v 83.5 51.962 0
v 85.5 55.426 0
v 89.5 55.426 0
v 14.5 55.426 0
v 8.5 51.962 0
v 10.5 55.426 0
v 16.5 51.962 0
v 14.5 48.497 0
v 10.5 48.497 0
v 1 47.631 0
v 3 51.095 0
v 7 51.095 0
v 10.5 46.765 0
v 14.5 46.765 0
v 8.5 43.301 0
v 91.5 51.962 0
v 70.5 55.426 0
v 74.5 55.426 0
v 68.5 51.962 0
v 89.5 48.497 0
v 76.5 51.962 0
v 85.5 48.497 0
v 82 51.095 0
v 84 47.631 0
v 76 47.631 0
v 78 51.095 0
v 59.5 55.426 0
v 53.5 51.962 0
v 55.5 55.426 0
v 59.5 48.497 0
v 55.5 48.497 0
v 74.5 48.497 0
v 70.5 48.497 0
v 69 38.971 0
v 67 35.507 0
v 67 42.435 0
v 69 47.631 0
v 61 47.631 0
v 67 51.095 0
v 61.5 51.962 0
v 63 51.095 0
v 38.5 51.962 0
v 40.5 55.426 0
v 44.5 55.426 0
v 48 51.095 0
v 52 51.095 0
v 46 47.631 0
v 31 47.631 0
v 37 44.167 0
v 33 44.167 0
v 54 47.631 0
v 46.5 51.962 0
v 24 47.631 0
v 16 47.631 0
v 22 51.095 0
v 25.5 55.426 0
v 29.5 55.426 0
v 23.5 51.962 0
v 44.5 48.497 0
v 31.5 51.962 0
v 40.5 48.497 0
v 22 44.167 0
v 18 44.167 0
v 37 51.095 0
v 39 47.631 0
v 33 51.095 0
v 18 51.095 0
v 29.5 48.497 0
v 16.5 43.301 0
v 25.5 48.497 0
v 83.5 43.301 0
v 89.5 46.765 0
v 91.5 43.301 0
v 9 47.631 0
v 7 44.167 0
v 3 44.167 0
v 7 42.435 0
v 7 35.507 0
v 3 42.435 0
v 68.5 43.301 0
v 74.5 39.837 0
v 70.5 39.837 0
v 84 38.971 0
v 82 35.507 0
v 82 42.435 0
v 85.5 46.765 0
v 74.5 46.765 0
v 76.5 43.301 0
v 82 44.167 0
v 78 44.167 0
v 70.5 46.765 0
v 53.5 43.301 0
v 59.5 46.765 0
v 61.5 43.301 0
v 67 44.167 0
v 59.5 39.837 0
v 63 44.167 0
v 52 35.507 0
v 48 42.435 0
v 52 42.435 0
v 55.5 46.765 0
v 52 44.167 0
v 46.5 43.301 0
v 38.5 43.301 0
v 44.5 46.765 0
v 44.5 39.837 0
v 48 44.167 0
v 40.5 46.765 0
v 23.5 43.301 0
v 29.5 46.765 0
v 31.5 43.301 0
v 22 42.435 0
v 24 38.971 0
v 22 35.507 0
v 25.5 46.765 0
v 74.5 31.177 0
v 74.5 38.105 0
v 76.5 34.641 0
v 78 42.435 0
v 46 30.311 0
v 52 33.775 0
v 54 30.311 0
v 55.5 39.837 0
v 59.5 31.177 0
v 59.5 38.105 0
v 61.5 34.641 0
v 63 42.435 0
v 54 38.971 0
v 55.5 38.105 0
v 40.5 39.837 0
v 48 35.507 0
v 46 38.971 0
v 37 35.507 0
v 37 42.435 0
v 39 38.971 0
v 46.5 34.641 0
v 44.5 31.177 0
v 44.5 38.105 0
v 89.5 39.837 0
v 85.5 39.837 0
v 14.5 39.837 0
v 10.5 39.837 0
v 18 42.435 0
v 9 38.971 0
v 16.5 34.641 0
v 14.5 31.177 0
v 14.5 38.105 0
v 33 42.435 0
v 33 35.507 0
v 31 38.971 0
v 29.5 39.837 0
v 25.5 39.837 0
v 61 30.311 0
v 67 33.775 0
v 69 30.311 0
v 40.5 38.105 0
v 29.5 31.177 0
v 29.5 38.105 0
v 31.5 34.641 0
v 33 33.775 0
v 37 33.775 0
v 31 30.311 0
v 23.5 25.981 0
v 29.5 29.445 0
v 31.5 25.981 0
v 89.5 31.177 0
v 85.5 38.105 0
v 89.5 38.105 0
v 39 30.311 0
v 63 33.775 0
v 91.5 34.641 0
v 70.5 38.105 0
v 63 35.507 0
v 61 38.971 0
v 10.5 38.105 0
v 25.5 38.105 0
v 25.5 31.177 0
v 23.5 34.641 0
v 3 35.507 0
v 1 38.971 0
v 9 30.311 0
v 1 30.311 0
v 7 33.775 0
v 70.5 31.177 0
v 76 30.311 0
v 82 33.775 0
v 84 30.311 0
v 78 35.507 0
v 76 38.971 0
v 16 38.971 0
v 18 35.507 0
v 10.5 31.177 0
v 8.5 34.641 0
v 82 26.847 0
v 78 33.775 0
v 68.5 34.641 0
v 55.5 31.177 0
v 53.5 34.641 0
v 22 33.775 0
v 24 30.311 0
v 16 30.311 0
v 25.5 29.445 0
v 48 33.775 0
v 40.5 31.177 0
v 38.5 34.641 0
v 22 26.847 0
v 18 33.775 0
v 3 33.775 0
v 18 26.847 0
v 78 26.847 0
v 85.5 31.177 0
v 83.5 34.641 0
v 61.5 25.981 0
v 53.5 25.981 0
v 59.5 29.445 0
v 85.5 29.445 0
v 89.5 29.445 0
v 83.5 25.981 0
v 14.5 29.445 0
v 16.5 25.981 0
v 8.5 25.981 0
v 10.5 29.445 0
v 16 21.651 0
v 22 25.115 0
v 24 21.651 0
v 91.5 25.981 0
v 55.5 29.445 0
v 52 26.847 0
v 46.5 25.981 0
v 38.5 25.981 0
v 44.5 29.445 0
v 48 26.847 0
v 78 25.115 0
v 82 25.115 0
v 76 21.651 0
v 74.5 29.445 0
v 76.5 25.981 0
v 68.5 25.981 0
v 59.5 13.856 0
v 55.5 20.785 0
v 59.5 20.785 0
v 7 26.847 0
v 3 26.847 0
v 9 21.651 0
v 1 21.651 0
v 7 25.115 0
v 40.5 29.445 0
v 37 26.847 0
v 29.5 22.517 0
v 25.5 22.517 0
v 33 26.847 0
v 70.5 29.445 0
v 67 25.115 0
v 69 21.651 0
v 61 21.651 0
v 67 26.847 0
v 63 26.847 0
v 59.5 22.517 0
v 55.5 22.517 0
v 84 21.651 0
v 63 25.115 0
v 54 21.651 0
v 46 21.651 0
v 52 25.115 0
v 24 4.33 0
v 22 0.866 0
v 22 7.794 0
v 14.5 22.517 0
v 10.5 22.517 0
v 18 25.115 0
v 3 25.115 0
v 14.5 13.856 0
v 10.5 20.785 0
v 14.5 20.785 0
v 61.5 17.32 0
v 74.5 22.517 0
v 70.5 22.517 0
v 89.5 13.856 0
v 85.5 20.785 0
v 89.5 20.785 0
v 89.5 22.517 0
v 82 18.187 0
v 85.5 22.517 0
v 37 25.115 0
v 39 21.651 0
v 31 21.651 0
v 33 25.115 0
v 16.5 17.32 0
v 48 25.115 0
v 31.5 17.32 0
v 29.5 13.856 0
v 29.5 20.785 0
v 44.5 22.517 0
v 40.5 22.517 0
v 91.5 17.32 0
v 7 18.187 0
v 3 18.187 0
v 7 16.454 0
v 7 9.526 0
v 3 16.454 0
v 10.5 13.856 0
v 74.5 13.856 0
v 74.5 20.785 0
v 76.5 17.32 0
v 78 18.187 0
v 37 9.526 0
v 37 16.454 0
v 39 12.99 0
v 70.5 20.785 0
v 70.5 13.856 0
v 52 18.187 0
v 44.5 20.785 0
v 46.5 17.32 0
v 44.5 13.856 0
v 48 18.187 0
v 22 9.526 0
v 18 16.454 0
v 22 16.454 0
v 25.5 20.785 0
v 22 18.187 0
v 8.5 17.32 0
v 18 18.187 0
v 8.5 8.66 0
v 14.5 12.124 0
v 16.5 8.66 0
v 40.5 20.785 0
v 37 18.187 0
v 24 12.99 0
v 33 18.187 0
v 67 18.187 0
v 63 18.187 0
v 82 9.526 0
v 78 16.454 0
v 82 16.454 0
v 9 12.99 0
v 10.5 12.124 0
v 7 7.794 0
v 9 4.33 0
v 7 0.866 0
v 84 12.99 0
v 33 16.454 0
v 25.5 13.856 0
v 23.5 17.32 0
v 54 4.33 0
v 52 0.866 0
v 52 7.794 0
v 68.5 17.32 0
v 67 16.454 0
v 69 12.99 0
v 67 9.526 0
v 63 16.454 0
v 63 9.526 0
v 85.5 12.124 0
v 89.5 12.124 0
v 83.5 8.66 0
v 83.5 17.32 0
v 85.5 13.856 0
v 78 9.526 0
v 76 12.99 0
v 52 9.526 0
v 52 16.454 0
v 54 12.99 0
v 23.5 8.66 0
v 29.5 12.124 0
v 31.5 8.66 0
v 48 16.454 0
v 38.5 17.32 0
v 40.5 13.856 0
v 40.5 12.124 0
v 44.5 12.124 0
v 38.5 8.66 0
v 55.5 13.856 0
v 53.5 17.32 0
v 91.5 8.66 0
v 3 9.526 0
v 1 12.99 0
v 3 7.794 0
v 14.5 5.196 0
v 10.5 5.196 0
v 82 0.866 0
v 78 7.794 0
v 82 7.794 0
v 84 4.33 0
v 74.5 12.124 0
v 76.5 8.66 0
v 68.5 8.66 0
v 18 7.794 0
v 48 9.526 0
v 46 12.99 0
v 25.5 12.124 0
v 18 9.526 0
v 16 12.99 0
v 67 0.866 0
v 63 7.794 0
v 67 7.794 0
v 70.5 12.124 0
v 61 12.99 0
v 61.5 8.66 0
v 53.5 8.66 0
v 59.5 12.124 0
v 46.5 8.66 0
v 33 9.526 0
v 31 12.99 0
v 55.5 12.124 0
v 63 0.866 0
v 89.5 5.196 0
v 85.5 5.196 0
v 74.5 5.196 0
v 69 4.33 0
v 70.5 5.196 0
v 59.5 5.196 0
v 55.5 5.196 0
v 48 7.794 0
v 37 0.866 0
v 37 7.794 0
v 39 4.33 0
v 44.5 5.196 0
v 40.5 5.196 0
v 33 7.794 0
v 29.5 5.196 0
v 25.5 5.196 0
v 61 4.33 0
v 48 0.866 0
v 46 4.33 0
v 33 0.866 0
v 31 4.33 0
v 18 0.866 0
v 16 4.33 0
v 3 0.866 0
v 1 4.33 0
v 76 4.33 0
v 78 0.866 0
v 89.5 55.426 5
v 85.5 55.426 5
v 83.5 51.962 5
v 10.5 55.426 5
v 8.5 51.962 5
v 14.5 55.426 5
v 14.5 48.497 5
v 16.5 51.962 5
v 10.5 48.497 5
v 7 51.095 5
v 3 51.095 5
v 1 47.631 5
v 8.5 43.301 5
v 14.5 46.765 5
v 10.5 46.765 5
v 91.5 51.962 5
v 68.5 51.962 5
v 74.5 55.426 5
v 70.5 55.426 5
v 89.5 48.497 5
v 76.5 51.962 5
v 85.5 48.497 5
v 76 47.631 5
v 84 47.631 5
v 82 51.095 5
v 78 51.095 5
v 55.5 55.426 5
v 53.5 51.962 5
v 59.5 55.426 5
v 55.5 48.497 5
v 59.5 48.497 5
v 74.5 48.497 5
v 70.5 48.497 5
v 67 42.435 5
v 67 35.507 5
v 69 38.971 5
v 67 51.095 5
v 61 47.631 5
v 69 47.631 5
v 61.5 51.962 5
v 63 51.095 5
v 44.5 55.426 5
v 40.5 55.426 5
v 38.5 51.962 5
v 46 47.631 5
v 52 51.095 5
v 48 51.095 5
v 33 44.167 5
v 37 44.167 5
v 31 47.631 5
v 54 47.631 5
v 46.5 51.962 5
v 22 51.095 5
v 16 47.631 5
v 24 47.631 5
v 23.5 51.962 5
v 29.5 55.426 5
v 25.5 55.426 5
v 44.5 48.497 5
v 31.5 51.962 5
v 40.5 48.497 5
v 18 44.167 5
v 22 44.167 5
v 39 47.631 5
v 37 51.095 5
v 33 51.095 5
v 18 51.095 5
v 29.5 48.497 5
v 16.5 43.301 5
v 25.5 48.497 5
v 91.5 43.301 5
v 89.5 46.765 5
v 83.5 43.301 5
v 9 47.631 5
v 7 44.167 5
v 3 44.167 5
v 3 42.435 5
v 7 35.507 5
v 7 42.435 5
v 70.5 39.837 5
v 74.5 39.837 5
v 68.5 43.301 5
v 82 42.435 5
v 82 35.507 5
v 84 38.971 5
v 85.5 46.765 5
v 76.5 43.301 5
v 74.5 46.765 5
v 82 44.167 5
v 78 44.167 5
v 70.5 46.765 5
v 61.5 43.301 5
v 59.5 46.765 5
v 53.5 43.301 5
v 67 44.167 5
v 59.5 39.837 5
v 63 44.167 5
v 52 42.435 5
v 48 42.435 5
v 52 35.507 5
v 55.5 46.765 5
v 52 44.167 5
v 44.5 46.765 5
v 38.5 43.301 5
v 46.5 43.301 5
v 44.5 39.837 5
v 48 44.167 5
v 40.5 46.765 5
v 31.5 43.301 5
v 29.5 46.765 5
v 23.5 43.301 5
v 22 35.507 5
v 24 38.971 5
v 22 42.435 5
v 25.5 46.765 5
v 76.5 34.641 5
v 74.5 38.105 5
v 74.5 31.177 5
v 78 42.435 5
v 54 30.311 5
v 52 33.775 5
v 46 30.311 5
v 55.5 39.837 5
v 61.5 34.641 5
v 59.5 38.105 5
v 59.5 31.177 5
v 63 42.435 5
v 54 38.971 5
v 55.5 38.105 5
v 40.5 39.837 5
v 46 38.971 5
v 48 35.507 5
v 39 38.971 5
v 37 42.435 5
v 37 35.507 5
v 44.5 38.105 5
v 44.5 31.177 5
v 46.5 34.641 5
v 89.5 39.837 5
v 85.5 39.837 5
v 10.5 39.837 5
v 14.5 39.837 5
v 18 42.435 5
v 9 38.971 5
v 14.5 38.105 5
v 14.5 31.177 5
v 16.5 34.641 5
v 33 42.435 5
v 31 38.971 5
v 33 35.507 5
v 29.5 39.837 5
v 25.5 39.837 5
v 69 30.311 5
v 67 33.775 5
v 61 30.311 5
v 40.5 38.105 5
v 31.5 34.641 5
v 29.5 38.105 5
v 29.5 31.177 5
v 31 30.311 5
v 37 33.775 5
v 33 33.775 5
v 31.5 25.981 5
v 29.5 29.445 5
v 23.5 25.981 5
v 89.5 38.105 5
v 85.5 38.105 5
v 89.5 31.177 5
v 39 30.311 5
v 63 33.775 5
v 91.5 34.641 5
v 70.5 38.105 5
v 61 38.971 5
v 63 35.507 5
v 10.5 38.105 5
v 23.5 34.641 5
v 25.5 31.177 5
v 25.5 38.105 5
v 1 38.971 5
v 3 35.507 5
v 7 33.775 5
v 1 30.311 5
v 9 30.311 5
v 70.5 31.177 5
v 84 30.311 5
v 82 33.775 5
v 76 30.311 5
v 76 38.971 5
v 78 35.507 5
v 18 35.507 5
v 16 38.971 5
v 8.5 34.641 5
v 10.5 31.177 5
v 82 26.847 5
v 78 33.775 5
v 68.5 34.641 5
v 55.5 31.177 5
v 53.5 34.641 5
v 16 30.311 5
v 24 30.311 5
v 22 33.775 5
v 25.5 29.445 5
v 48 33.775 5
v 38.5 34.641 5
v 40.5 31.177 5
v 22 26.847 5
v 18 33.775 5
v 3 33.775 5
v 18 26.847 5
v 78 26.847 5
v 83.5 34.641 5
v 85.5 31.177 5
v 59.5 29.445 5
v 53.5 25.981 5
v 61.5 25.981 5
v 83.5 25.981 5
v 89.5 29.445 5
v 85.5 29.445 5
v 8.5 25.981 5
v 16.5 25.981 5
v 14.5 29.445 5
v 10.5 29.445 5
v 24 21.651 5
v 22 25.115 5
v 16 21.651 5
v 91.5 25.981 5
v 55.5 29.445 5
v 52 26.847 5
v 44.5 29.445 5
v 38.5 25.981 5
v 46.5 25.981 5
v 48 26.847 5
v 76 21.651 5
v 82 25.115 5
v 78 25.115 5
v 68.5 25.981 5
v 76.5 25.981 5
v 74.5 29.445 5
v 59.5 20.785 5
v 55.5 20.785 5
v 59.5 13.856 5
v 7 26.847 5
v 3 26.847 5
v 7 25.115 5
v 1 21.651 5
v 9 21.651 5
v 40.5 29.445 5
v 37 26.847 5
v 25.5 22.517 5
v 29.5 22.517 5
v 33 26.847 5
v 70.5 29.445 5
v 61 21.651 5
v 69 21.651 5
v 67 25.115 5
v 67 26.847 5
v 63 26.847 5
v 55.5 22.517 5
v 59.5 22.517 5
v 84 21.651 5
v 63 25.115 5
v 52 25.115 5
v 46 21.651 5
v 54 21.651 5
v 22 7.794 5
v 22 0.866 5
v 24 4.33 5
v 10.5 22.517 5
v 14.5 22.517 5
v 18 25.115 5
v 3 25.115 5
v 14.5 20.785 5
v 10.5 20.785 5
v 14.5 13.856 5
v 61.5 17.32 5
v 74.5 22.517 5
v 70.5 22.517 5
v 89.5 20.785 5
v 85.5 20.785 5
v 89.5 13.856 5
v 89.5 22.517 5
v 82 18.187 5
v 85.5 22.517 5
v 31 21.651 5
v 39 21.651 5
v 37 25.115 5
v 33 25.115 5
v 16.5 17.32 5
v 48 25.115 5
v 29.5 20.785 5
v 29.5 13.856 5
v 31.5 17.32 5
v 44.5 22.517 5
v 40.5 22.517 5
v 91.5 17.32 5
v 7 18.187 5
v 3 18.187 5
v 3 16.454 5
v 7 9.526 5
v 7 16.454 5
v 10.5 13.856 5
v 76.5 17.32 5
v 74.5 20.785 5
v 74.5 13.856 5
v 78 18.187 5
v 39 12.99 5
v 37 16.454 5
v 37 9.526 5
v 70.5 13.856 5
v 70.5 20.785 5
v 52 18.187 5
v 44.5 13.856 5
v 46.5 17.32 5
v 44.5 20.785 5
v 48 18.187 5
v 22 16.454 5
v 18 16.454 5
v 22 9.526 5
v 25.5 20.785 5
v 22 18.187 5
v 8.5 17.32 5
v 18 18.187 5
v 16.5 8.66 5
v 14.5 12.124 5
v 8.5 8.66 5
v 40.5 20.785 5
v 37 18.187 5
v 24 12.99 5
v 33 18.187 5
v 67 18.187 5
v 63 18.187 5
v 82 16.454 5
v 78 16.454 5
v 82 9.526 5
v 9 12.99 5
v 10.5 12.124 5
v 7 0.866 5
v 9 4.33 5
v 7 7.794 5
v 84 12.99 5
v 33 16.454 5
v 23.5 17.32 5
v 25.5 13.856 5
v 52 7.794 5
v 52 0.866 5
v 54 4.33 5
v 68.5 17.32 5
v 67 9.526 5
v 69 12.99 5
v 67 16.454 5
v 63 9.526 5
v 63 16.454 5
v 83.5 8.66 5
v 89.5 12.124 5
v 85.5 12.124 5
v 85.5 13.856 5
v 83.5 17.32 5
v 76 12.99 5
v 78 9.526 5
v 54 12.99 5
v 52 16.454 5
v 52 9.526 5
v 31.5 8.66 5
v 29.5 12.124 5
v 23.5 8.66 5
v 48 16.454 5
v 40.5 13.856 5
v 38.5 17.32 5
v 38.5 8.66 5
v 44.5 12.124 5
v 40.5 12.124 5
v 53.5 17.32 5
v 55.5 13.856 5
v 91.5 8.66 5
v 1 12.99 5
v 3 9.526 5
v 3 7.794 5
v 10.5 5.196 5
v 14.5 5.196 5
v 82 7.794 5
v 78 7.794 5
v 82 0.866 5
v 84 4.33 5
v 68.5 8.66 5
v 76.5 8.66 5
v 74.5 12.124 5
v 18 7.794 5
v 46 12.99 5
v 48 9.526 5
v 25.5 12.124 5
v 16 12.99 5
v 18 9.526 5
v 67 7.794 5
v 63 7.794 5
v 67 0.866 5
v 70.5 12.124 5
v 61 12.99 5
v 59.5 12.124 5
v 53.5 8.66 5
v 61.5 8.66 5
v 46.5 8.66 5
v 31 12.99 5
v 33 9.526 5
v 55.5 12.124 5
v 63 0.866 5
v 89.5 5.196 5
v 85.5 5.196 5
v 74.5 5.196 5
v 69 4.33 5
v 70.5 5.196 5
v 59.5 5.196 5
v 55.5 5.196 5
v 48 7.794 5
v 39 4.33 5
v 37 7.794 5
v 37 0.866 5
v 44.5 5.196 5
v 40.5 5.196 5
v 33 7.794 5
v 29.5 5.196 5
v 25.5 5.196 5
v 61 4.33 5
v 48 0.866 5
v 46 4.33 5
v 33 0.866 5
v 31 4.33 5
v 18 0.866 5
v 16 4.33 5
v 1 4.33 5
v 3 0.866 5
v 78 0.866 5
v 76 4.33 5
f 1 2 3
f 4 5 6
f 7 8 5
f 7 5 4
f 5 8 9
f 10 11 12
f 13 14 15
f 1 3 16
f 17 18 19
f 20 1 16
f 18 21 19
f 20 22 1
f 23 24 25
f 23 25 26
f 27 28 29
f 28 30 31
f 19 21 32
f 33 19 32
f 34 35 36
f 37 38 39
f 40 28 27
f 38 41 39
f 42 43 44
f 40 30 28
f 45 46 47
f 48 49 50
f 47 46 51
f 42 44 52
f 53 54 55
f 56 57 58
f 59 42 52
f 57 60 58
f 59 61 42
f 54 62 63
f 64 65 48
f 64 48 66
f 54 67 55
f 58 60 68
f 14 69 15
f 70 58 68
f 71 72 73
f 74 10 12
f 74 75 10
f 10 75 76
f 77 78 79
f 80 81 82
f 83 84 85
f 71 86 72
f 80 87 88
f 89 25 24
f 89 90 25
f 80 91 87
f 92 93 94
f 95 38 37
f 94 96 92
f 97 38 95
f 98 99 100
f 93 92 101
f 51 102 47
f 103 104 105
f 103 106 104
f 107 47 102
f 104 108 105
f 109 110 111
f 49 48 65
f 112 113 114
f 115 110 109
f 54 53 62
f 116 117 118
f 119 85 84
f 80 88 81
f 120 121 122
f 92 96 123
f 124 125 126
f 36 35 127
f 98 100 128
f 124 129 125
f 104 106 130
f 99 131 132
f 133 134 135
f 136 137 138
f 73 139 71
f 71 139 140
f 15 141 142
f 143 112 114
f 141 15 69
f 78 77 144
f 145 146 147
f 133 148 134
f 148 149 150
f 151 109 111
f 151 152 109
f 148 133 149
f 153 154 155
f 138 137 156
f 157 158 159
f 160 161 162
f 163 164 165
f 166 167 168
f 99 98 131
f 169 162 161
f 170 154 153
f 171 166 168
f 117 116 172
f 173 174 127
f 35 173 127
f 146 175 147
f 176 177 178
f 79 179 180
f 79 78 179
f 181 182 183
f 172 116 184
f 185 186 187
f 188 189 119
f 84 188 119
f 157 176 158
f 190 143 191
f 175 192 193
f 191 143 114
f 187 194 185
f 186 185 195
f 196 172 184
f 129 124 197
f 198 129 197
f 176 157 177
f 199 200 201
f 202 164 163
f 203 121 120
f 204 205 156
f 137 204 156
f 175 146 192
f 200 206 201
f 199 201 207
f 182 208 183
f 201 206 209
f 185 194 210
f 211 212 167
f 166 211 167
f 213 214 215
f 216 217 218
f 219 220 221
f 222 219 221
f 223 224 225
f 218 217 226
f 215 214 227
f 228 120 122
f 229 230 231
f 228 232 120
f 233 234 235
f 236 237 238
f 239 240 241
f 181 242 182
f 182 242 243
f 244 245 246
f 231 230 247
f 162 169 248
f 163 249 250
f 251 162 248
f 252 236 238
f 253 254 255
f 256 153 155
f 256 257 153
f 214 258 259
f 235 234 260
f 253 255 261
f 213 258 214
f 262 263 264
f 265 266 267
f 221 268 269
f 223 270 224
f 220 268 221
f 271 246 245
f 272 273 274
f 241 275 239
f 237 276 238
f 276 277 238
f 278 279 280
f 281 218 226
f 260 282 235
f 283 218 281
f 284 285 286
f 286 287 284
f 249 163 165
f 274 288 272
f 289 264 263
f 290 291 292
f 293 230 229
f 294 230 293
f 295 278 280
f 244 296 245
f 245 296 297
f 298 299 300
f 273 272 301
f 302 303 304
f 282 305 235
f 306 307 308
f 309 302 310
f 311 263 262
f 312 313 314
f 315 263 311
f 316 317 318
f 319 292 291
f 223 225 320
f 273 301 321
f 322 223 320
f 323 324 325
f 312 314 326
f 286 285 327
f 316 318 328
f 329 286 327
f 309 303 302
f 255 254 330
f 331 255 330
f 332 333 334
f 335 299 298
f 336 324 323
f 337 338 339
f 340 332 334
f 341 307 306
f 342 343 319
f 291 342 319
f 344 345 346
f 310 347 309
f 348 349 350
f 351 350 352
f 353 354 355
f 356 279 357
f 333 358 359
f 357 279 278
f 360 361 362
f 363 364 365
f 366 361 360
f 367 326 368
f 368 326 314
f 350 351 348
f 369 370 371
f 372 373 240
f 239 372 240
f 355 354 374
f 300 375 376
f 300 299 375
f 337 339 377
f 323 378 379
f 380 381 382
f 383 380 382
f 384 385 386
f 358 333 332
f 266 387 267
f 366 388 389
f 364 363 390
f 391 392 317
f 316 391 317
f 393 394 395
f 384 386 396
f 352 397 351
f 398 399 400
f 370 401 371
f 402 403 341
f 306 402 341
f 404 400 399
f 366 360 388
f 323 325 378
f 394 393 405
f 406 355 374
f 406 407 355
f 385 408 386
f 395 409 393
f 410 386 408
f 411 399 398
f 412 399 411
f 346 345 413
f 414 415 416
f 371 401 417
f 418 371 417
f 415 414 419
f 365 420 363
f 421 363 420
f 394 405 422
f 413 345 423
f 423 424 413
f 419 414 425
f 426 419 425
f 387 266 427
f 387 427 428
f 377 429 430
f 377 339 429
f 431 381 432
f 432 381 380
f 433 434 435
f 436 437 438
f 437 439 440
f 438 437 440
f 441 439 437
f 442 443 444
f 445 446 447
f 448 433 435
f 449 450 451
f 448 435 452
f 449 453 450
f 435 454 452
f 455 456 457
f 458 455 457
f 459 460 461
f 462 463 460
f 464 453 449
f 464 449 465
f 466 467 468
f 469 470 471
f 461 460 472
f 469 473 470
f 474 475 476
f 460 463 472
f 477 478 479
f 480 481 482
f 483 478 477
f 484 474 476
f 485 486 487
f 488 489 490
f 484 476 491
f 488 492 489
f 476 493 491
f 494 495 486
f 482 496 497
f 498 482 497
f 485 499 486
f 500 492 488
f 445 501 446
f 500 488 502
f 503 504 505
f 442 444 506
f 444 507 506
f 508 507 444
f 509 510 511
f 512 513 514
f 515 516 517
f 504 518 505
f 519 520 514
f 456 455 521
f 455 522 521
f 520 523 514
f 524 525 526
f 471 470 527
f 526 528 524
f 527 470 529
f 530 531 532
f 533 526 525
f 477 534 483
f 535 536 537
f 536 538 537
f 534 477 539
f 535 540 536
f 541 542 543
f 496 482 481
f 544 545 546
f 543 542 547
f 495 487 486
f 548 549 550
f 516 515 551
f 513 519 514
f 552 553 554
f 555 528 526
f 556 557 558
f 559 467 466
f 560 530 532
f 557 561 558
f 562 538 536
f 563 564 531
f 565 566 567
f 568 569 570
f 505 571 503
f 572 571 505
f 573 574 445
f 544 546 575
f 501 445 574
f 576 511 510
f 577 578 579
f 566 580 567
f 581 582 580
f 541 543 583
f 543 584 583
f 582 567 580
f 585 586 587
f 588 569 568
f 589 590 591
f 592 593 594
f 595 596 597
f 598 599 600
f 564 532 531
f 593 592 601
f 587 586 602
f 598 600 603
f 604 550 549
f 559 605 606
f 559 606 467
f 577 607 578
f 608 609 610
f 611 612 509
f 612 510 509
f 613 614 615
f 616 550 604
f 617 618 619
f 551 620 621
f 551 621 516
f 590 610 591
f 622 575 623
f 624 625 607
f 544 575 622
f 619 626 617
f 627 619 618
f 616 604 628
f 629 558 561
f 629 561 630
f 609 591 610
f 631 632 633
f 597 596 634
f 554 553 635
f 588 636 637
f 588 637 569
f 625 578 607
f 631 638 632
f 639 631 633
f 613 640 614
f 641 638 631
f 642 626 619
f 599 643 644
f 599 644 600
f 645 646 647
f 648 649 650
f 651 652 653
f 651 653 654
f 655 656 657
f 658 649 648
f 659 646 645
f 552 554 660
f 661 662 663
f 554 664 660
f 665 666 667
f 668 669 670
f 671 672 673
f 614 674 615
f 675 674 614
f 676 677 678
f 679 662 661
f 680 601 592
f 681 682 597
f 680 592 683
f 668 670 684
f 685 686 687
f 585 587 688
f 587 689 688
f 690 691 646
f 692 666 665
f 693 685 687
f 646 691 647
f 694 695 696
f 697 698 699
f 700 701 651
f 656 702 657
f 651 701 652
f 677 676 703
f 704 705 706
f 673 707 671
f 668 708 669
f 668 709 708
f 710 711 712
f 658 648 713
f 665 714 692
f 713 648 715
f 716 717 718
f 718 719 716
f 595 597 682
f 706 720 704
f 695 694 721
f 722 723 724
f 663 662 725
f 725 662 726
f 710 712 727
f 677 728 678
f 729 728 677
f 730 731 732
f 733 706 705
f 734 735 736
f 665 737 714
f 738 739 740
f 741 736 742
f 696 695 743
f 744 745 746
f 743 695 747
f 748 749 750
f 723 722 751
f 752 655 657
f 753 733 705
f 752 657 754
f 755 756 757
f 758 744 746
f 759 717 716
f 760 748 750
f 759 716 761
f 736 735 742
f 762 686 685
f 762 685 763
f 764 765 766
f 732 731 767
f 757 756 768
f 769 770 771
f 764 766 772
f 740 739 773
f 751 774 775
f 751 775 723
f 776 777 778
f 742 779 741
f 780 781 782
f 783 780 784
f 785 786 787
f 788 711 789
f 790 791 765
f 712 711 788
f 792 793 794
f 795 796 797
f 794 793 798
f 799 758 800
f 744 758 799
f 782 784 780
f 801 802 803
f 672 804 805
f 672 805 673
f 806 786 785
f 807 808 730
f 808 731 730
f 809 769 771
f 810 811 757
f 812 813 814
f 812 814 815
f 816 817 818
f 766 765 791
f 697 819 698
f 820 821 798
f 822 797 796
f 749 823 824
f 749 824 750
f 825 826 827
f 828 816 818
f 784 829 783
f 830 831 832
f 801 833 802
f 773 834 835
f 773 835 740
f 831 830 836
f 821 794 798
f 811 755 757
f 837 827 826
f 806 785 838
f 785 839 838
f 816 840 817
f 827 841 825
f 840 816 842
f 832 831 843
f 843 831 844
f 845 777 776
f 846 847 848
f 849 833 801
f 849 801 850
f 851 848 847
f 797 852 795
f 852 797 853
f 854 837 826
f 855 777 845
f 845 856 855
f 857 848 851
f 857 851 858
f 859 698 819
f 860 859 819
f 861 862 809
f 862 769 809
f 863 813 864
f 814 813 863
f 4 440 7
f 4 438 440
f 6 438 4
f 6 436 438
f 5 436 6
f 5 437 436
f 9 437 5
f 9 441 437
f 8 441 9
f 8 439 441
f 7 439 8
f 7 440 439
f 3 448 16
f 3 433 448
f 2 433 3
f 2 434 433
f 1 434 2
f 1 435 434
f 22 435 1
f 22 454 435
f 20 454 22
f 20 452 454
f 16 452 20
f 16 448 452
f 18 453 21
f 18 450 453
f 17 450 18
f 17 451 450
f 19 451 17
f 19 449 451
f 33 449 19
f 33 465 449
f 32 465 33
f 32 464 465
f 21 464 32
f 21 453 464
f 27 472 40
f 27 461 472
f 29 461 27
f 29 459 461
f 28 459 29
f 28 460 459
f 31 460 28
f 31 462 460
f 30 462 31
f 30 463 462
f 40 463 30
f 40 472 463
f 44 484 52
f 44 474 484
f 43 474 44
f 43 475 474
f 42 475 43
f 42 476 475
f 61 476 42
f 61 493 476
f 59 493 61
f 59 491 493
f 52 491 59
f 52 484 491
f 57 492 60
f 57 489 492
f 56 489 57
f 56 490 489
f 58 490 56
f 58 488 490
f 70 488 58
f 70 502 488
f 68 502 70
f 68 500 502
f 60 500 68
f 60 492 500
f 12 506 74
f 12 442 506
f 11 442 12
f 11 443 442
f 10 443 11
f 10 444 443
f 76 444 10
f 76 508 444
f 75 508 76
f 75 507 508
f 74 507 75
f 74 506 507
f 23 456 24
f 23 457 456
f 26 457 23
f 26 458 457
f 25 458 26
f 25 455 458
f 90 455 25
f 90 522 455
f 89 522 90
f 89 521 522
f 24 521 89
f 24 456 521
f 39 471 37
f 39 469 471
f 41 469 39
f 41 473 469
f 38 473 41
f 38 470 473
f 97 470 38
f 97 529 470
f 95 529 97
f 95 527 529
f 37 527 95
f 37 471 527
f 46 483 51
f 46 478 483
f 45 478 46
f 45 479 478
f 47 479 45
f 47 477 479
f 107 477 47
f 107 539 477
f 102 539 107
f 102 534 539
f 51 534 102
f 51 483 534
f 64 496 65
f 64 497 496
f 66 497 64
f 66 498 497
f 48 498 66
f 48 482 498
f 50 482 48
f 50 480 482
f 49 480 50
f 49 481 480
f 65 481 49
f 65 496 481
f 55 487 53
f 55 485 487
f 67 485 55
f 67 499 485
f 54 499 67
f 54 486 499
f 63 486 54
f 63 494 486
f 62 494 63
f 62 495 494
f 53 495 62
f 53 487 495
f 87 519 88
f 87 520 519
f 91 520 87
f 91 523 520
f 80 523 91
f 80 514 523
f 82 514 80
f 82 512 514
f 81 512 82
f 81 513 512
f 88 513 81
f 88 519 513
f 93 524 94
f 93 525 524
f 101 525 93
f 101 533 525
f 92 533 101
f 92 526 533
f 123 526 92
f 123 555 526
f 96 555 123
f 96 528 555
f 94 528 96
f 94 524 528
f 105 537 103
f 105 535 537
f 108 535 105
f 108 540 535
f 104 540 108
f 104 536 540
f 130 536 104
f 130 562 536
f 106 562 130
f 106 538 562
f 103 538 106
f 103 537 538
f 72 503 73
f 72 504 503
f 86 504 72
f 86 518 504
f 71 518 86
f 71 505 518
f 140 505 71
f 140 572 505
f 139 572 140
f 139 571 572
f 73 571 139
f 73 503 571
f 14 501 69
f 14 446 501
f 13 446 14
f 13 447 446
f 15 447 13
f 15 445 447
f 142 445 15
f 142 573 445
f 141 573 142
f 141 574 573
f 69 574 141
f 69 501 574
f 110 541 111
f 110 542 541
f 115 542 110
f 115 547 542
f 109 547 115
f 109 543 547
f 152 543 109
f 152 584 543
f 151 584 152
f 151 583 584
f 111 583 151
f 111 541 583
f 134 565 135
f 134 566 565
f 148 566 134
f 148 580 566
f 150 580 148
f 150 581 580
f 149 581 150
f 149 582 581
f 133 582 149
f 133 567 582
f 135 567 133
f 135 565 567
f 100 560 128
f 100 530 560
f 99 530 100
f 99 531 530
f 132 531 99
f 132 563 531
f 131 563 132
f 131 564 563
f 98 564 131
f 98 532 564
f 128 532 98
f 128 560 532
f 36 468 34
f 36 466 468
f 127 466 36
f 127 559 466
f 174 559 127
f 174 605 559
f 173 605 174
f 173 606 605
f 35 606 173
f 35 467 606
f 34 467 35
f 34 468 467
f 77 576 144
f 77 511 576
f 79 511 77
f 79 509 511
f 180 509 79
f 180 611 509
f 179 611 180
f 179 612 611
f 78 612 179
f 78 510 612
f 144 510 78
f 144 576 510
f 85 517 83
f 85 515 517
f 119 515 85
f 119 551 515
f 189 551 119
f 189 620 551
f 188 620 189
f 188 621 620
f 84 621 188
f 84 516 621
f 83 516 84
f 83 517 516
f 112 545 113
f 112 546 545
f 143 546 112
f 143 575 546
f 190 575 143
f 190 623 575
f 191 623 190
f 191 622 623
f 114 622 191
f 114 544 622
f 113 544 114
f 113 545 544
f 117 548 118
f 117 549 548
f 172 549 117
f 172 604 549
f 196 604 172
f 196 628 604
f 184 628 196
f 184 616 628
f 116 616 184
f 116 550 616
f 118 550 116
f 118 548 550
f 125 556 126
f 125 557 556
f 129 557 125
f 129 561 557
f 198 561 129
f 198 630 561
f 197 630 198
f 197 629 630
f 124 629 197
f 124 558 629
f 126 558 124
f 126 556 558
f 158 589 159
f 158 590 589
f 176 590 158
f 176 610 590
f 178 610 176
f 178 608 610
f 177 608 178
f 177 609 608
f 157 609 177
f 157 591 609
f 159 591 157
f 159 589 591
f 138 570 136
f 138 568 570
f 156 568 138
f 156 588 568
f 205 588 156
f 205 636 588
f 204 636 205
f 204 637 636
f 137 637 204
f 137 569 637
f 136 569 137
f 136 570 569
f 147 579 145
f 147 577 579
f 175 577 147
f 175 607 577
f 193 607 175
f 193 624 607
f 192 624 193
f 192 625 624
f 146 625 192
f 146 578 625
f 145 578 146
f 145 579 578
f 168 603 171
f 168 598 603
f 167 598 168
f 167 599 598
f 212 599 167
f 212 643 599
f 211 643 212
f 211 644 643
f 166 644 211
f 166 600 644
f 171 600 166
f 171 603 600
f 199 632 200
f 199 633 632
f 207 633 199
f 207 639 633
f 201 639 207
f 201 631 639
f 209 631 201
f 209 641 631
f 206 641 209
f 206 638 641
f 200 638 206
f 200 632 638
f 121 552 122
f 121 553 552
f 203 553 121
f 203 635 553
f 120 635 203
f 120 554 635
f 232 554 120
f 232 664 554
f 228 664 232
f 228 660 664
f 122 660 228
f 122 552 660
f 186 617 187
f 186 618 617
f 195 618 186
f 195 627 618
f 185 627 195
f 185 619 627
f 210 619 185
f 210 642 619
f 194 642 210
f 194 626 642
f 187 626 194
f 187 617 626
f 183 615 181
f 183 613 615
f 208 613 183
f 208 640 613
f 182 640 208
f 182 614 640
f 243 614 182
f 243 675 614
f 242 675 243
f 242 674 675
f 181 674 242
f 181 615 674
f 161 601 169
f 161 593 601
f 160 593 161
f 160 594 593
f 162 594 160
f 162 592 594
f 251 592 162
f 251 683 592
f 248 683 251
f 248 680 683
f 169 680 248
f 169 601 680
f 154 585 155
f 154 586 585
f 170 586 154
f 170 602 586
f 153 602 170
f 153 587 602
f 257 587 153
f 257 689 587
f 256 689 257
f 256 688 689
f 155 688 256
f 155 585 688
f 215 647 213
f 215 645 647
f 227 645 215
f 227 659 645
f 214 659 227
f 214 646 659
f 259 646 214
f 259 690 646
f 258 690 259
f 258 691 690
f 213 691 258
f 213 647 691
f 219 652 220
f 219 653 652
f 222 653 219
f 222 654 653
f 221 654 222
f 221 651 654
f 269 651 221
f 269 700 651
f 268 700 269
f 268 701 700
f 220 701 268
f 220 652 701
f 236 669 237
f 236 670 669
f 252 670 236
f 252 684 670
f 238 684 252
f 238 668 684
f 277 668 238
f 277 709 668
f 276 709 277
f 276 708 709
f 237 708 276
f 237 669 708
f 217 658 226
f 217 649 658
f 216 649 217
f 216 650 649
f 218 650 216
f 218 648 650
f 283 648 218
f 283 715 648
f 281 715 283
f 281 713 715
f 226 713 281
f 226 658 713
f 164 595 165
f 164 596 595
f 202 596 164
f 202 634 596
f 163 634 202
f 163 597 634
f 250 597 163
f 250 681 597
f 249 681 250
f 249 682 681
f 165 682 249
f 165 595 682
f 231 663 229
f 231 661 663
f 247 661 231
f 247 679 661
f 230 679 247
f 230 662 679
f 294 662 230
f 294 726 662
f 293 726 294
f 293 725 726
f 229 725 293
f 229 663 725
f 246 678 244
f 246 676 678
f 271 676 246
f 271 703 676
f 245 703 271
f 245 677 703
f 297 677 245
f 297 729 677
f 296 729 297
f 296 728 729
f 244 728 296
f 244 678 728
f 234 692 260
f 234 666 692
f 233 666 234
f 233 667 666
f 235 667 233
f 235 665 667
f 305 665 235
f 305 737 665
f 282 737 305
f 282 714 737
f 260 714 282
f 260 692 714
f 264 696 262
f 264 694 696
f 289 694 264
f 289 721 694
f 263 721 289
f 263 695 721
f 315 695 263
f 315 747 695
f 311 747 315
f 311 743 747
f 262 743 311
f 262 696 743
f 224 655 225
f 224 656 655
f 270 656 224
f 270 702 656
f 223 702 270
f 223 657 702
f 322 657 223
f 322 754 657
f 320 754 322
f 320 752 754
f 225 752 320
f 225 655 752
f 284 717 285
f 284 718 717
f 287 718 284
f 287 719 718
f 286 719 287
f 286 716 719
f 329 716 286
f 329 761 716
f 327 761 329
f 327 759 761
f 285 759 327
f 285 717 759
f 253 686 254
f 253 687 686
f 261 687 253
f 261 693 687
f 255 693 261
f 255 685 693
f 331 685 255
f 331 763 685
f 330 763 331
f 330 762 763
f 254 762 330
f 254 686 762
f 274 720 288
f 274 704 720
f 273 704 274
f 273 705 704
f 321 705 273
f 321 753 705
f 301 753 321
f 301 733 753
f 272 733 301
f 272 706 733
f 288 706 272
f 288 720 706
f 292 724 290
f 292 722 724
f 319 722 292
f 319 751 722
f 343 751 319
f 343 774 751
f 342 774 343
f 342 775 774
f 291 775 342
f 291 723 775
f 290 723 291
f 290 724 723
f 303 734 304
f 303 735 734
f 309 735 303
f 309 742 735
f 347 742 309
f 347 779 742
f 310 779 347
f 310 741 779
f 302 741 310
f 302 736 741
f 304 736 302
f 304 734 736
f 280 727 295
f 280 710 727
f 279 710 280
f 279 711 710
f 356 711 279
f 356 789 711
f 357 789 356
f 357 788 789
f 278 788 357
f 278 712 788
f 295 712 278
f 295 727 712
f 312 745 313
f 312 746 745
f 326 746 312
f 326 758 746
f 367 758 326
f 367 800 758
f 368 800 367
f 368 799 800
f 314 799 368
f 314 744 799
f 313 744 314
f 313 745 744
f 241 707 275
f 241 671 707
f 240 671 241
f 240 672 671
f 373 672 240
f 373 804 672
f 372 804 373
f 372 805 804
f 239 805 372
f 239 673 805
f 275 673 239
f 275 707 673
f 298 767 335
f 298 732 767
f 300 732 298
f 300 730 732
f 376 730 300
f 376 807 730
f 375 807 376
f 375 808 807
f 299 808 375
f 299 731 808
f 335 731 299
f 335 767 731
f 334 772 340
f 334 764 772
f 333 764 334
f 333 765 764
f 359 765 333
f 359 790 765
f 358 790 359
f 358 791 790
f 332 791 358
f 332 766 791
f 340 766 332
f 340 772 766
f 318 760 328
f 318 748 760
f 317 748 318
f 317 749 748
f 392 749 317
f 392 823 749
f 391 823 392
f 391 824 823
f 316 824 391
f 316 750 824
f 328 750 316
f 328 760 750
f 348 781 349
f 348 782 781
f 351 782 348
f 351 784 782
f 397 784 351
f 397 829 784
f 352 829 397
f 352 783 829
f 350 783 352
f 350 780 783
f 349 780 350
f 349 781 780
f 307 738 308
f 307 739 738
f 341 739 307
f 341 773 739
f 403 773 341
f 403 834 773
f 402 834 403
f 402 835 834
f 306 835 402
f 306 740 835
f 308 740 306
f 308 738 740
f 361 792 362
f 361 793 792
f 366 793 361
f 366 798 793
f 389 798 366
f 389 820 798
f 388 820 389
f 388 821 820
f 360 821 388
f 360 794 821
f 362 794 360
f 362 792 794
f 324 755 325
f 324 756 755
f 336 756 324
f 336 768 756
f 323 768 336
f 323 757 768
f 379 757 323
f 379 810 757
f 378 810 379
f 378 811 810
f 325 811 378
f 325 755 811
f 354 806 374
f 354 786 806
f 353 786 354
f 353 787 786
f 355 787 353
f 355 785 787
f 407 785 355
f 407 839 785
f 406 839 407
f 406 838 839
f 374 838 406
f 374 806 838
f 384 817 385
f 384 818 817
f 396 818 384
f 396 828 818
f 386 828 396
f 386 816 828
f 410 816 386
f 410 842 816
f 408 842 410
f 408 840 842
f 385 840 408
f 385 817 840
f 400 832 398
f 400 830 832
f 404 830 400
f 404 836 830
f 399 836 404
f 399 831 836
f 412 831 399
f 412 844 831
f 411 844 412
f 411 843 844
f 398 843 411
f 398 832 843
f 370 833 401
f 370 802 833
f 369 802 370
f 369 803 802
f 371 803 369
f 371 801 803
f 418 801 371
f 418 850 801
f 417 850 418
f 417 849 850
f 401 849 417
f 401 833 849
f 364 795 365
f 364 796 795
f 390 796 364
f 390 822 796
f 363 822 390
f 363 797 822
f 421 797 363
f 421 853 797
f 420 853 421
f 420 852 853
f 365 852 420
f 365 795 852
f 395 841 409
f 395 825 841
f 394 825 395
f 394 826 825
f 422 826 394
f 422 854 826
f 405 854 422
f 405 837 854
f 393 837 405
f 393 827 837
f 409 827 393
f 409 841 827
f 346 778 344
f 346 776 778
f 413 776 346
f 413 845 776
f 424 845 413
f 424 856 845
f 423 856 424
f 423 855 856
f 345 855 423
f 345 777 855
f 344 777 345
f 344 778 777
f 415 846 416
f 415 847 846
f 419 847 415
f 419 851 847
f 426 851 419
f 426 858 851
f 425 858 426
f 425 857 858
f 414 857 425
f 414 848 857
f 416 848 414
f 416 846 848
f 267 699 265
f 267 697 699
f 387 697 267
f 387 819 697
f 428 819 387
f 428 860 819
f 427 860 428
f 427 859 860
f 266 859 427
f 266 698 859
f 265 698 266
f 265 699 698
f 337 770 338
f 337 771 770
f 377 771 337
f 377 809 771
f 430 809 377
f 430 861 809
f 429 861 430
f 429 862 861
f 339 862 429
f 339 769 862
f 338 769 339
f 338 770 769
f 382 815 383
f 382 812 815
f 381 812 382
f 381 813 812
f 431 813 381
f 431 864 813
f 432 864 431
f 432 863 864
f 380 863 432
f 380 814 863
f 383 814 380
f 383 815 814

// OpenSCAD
module hex_grid(x=50,y=60,z=5,d=5,thickness=2){
    $fn=6;
    //some important equations:
    side_l = d/2;
    short_width = (3^0.5)*side_l;
    nx = round(x/d/1.5);
    ny = round(y/short_width);
    color("orange",0.3)
    linear_extrude(z){
    translate([d/2,short_width/2])
    for(pos_x=[0:nx]){
        for(pos_y=[0:ny]){
            //echo(pos_x,pos_y);
            tx = pos_x*d*1.5;
            ty = pos_y*short_width;
            txa = tx+d*3/4;
            tya = ty+(short_width/2);
            if (tx+d<x && ty+short_width<y){
            color("red",0.5)translate([tx,ty])circle(d=d-thickness);}
            
            if (txa+d<x && tya+short_width<y){
                //echo("d=",d);
                //echo("d/2=",d/2);
                //echo("txa = ",txa);
                //echo(txa+d/2);
            translate([txa,tya])
            color("green",0.5)
                circle(d=d-thickness);}
    }}}
}//end hex_grid


hex_grid(d=10,x=100);
